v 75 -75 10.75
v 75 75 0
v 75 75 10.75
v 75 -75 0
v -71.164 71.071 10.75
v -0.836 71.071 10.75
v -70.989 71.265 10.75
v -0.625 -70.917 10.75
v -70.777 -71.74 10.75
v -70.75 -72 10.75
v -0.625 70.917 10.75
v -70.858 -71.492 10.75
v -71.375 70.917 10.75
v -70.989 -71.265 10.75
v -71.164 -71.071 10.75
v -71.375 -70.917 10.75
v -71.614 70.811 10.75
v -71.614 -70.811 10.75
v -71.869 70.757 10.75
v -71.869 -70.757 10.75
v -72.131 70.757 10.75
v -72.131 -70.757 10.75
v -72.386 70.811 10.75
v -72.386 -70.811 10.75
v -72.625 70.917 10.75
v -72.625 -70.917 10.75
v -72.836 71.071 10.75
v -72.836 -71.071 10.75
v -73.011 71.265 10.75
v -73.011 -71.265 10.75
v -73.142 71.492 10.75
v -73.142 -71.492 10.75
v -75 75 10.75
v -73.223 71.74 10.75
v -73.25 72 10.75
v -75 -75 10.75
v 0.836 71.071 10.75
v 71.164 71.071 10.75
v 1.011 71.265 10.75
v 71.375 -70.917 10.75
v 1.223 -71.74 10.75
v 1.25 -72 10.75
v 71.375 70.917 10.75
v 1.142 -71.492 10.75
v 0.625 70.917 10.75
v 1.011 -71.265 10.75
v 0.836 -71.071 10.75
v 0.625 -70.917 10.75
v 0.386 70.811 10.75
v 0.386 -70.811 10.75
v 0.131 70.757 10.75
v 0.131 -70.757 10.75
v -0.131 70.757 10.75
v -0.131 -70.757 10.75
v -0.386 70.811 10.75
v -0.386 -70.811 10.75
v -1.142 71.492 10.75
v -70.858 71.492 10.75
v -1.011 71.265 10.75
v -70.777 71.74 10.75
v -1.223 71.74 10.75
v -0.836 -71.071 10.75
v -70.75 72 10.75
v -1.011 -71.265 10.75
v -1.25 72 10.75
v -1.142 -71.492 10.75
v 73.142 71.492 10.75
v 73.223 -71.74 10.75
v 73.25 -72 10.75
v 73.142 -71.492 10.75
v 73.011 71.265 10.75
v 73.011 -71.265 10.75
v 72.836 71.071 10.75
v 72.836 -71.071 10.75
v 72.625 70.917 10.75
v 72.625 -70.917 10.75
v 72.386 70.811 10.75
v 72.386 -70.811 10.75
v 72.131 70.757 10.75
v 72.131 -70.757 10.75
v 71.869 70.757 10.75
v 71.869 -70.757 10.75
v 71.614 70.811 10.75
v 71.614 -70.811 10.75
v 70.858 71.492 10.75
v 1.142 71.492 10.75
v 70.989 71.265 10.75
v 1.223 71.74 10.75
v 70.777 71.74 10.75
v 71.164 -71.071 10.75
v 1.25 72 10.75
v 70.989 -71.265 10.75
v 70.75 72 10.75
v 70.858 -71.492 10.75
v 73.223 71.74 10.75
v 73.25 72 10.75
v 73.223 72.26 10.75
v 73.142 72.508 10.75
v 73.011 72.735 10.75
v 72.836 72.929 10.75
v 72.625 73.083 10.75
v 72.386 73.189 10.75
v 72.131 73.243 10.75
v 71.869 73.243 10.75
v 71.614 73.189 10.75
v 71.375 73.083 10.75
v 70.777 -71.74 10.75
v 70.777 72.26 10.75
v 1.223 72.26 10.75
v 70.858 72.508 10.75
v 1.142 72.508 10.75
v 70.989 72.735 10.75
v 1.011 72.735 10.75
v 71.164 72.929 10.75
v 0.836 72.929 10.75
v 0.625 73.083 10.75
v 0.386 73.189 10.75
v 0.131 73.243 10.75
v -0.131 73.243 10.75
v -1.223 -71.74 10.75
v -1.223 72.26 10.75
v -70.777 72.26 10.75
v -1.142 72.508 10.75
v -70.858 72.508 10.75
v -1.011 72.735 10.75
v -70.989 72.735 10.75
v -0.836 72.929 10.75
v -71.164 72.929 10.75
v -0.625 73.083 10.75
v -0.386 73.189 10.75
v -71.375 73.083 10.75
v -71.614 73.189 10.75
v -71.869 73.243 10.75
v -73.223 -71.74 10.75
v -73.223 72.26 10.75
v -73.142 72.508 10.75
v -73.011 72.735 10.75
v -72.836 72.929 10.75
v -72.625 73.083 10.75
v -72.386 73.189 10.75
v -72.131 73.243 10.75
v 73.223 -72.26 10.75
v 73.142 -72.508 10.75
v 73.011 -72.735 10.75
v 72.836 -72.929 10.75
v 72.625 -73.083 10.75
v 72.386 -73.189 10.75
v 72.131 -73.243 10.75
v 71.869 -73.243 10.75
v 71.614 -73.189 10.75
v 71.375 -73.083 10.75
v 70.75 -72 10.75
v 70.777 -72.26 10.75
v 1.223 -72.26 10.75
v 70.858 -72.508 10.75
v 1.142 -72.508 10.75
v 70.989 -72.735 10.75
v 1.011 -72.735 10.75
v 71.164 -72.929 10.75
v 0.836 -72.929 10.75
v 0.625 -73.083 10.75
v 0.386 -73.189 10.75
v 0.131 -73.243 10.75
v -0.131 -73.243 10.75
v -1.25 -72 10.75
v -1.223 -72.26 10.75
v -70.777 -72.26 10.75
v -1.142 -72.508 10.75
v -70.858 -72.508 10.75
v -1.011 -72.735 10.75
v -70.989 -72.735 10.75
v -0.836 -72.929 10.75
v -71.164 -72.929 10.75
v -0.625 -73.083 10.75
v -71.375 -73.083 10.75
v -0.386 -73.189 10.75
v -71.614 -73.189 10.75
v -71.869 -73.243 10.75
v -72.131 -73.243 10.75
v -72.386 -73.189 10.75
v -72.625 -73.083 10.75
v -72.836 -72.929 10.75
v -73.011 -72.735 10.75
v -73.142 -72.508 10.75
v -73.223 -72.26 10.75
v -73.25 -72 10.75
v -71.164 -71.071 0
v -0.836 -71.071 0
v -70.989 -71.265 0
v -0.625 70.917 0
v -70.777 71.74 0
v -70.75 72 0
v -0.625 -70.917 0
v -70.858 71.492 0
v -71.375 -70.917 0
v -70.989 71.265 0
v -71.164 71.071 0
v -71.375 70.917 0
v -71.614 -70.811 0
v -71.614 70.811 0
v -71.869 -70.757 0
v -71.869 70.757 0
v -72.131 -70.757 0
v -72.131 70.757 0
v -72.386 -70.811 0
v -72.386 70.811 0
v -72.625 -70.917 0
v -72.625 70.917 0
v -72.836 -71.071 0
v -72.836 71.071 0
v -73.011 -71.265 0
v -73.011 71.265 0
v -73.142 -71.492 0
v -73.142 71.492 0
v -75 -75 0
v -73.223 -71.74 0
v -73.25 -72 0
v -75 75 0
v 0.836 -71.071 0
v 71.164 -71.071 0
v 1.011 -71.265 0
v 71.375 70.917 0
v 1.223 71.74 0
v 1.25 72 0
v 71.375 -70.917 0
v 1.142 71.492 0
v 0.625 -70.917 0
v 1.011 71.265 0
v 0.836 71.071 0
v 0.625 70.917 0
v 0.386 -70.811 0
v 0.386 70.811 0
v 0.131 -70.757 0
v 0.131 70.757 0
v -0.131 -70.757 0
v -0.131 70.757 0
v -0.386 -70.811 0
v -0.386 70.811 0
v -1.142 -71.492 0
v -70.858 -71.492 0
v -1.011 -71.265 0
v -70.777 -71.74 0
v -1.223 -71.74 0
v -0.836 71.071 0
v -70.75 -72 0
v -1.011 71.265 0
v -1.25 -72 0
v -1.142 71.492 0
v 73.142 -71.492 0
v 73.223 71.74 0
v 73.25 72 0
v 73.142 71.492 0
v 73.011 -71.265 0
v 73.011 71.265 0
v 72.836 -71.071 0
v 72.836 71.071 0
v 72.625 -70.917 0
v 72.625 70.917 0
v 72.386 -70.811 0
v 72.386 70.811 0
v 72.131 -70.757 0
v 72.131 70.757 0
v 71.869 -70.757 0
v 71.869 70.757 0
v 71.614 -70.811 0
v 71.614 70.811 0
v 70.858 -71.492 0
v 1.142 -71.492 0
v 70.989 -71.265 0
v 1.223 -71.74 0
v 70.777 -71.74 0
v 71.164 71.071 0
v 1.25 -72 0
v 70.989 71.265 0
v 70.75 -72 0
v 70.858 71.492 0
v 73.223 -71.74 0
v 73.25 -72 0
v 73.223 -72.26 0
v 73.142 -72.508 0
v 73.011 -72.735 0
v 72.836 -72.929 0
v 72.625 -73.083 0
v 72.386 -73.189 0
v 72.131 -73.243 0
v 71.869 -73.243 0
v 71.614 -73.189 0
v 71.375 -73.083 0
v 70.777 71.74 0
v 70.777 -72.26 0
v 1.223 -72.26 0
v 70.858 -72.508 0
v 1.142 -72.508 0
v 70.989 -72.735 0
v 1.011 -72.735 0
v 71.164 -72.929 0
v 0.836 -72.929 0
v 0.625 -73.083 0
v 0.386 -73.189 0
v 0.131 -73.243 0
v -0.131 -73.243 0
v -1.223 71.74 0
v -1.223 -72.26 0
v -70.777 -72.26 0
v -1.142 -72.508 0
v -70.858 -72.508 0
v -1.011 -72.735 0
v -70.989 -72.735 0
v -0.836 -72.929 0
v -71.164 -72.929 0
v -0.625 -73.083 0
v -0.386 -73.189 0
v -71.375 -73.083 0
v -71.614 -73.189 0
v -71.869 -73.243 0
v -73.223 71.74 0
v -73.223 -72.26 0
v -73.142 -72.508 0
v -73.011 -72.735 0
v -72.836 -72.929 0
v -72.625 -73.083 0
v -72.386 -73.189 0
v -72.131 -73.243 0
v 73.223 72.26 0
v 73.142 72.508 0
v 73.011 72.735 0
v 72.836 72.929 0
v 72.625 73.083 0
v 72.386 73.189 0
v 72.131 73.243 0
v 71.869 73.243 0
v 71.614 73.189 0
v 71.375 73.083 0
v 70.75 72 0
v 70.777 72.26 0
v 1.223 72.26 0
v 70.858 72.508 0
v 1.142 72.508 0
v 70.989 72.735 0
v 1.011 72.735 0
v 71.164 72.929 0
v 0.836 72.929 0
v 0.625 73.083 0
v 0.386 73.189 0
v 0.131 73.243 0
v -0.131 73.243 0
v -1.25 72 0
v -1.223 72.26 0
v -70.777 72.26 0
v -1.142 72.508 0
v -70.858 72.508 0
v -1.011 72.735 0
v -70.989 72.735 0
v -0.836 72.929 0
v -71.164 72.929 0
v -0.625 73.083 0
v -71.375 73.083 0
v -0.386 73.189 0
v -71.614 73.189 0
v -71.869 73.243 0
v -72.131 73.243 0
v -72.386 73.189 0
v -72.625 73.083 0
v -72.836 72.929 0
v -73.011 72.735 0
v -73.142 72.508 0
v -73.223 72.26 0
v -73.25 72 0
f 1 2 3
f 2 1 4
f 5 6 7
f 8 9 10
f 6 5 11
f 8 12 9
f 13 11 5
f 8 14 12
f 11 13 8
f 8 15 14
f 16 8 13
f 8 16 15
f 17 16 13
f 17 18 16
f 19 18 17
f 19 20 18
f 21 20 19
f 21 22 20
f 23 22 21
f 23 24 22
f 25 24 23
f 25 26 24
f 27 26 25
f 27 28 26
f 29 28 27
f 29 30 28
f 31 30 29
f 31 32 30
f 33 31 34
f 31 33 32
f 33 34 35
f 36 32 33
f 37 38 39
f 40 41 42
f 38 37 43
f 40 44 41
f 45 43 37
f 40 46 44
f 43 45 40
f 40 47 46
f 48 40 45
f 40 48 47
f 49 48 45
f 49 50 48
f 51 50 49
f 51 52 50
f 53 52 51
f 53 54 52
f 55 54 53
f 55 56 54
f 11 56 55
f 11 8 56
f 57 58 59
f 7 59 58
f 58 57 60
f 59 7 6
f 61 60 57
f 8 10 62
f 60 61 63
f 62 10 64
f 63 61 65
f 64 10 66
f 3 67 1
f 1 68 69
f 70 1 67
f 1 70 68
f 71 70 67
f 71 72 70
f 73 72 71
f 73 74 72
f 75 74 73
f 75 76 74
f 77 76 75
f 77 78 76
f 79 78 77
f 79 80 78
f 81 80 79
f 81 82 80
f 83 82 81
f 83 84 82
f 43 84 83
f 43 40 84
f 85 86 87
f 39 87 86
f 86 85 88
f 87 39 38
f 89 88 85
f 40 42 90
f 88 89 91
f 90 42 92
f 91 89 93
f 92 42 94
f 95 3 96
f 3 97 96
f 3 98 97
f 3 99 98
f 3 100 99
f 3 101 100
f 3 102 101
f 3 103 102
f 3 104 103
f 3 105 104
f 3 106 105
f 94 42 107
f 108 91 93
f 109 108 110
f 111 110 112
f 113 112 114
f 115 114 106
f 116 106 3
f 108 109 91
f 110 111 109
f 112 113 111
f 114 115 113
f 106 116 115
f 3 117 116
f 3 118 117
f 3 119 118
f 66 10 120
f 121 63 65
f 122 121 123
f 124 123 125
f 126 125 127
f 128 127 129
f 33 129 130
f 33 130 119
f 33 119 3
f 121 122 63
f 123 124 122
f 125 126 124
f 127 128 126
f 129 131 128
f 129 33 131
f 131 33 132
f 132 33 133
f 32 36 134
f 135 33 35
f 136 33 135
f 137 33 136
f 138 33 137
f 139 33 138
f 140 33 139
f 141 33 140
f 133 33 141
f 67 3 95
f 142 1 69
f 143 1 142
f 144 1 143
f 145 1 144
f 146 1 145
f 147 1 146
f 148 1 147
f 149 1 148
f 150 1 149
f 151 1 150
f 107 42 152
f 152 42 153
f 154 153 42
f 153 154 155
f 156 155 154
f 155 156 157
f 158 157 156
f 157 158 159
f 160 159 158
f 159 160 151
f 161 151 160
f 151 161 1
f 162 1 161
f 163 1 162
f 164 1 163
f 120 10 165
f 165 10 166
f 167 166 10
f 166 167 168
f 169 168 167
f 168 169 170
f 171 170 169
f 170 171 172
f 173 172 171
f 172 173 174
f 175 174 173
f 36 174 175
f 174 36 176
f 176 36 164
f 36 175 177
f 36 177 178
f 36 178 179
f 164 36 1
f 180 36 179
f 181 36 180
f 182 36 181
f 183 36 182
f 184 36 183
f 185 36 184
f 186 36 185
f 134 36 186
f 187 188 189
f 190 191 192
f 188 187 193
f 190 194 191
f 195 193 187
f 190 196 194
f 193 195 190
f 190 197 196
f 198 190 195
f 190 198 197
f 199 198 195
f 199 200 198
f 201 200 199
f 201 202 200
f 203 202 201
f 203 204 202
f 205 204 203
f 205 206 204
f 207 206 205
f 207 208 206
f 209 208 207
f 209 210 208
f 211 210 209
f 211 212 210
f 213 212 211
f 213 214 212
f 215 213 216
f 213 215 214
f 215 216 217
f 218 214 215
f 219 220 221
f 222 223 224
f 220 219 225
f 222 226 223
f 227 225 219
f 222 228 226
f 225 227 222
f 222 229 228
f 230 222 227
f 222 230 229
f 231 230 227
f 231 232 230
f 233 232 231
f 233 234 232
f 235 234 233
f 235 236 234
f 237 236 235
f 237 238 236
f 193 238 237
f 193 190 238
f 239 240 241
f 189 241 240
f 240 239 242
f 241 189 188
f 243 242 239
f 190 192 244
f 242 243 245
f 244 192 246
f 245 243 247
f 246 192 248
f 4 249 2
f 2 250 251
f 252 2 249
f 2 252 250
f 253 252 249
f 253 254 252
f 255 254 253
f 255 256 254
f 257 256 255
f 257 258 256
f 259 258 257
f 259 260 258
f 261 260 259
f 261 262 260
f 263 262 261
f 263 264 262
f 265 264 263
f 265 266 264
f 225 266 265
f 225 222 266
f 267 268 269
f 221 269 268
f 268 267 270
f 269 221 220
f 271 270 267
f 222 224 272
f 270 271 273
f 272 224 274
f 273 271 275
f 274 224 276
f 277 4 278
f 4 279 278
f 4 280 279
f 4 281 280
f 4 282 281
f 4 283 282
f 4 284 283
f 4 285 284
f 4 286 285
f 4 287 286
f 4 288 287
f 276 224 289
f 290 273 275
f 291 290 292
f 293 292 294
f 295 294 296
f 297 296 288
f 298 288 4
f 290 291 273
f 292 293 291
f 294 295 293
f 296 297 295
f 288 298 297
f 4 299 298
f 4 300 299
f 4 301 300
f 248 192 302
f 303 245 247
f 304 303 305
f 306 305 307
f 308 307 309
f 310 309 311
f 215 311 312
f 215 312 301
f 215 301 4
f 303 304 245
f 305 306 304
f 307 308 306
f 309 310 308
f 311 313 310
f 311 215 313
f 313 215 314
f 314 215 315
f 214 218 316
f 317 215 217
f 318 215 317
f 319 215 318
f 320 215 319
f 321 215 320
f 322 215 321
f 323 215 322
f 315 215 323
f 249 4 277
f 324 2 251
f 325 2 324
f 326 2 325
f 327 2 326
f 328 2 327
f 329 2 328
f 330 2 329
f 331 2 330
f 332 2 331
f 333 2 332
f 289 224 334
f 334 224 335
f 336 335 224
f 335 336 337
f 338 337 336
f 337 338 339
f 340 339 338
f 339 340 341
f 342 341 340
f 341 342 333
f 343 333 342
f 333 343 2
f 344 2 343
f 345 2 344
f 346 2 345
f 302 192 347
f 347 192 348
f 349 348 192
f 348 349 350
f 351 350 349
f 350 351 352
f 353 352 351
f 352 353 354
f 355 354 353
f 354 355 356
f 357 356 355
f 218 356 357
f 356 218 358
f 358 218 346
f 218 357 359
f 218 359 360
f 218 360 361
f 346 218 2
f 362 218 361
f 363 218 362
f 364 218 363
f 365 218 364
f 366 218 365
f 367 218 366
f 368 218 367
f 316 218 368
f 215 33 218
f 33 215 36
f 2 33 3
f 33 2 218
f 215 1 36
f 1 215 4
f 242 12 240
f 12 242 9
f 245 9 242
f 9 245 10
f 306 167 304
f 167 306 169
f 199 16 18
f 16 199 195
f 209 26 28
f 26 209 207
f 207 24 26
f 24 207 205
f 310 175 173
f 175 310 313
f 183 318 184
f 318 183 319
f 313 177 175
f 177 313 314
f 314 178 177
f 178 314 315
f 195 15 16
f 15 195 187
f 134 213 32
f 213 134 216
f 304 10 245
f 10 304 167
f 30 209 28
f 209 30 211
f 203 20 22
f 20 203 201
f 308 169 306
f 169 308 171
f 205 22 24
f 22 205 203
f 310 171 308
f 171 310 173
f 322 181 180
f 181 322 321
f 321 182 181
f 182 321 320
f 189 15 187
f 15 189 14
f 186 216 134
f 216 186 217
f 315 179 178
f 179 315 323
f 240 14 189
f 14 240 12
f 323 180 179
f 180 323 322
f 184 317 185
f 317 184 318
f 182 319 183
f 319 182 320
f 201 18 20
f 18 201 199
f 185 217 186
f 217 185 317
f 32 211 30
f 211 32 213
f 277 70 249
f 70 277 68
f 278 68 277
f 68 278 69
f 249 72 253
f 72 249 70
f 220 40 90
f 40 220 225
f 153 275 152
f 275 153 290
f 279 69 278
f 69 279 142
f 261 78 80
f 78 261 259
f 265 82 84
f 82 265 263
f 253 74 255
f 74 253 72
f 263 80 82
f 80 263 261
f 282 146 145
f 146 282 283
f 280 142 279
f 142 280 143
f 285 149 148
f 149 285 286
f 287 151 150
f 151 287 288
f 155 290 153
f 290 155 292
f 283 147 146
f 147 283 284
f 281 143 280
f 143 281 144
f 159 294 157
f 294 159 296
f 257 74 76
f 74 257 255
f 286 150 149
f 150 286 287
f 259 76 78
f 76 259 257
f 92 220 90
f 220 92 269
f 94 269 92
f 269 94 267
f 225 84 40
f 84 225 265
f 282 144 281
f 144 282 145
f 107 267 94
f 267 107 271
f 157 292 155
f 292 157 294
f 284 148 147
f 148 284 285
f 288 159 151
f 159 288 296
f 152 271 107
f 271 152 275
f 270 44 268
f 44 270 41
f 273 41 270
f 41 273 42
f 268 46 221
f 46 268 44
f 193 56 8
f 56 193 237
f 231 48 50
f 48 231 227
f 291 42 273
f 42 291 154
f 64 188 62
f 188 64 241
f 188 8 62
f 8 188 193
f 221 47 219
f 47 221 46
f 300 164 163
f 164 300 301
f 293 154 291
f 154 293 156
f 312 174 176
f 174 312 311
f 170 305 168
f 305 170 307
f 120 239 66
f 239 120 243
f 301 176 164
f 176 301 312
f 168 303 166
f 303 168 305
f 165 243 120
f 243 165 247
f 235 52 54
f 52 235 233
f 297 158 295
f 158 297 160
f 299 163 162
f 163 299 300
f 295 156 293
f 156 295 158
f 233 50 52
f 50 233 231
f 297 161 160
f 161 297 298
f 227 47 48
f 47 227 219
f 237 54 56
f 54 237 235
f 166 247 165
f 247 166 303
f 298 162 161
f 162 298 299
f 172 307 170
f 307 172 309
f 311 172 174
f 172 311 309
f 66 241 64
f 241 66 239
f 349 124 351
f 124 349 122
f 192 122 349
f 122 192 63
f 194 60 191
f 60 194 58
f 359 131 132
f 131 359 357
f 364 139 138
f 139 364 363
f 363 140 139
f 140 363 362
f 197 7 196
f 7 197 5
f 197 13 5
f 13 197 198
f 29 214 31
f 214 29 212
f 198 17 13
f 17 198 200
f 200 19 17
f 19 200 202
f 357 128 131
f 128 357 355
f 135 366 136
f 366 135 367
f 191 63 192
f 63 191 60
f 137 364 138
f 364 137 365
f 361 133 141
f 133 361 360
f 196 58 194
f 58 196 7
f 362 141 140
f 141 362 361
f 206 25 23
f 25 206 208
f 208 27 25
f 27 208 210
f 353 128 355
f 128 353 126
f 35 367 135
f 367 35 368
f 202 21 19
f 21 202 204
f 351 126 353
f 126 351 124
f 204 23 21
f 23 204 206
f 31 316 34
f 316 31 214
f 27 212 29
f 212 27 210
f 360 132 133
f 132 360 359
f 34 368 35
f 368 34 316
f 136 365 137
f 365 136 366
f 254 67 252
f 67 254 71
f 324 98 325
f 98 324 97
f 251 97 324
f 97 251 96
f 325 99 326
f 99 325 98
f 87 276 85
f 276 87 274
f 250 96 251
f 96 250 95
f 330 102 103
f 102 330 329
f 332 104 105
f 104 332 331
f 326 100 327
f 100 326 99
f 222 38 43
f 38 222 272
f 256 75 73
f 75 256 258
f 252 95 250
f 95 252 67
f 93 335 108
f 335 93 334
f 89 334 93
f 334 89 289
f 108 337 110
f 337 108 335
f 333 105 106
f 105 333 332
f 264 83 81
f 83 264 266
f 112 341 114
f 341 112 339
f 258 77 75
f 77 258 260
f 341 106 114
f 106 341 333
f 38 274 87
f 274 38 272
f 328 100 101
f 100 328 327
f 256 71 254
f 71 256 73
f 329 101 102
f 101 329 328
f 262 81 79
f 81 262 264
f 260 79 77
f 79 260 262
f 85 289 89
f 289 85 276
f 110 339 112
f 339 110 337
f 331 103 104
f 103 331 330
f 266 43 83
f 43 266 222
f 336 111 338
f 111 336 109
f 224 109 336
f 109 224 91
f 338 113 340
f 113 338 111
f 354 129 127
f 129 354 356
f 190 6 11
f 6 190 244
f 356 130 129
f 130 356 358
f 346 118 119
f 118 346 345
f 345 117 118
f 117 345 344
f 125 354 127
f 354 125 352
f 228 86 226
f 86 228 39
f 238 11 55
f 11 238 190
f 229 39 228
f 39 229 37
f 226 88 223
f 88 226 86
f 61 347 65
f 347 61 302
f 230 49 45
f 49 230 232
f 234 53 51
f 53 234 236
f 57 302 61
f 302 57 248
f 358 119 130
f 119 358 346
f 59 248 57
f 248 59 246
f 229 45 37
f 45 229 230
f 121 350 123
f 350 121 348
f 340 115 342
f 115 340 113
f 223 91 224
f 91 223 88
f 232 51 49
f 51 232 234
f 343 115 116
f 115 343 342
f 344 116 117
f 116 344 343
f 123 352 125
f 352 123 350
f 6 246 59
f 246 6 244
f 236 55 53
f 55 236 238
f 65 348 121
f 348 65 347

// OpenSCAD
width = 150;
height = 150;
thickness = 10.75;

//material
//material(width, height, thickness, 3.1);

//base
material(width, height, thickness, 2.5);

$fs = 0.1;

module material(width, height, thickness, holesize)
{
	halfwidth = width/2;
	halfheight = height/2;
	holex = halfwidth-3;
	holey = halfheight-3;

	difference()
	{
		translate([-halfwidth, -halfheight, 0])
			cube([width, height, thickness]);

		translate([-holex, -holey, thickness/2])
			cylinder(r=holesize/2, h=thickness+1, center=true);
		translate([holex, -holey, thickness/2])
			cylinder(r=holesize/2, h=thickness+1, center=true);
		translate([0, -holey, thickness/2])
			cylinder(r=holesize/2, h=thickness+1, center=true);
		translate([-holex, holey, thickness/2])
			cylinder(r=holesize/2, h=thickness+1, center=true);
		translate([holex, holey, thickness/2])
			cylinder(r=holesize/2, h=thickness+1, center=true);
		translate([0, holey, thickness/2])
			cylinder(r=holesize/2, h=thickness+1, center=true);
	}
}
